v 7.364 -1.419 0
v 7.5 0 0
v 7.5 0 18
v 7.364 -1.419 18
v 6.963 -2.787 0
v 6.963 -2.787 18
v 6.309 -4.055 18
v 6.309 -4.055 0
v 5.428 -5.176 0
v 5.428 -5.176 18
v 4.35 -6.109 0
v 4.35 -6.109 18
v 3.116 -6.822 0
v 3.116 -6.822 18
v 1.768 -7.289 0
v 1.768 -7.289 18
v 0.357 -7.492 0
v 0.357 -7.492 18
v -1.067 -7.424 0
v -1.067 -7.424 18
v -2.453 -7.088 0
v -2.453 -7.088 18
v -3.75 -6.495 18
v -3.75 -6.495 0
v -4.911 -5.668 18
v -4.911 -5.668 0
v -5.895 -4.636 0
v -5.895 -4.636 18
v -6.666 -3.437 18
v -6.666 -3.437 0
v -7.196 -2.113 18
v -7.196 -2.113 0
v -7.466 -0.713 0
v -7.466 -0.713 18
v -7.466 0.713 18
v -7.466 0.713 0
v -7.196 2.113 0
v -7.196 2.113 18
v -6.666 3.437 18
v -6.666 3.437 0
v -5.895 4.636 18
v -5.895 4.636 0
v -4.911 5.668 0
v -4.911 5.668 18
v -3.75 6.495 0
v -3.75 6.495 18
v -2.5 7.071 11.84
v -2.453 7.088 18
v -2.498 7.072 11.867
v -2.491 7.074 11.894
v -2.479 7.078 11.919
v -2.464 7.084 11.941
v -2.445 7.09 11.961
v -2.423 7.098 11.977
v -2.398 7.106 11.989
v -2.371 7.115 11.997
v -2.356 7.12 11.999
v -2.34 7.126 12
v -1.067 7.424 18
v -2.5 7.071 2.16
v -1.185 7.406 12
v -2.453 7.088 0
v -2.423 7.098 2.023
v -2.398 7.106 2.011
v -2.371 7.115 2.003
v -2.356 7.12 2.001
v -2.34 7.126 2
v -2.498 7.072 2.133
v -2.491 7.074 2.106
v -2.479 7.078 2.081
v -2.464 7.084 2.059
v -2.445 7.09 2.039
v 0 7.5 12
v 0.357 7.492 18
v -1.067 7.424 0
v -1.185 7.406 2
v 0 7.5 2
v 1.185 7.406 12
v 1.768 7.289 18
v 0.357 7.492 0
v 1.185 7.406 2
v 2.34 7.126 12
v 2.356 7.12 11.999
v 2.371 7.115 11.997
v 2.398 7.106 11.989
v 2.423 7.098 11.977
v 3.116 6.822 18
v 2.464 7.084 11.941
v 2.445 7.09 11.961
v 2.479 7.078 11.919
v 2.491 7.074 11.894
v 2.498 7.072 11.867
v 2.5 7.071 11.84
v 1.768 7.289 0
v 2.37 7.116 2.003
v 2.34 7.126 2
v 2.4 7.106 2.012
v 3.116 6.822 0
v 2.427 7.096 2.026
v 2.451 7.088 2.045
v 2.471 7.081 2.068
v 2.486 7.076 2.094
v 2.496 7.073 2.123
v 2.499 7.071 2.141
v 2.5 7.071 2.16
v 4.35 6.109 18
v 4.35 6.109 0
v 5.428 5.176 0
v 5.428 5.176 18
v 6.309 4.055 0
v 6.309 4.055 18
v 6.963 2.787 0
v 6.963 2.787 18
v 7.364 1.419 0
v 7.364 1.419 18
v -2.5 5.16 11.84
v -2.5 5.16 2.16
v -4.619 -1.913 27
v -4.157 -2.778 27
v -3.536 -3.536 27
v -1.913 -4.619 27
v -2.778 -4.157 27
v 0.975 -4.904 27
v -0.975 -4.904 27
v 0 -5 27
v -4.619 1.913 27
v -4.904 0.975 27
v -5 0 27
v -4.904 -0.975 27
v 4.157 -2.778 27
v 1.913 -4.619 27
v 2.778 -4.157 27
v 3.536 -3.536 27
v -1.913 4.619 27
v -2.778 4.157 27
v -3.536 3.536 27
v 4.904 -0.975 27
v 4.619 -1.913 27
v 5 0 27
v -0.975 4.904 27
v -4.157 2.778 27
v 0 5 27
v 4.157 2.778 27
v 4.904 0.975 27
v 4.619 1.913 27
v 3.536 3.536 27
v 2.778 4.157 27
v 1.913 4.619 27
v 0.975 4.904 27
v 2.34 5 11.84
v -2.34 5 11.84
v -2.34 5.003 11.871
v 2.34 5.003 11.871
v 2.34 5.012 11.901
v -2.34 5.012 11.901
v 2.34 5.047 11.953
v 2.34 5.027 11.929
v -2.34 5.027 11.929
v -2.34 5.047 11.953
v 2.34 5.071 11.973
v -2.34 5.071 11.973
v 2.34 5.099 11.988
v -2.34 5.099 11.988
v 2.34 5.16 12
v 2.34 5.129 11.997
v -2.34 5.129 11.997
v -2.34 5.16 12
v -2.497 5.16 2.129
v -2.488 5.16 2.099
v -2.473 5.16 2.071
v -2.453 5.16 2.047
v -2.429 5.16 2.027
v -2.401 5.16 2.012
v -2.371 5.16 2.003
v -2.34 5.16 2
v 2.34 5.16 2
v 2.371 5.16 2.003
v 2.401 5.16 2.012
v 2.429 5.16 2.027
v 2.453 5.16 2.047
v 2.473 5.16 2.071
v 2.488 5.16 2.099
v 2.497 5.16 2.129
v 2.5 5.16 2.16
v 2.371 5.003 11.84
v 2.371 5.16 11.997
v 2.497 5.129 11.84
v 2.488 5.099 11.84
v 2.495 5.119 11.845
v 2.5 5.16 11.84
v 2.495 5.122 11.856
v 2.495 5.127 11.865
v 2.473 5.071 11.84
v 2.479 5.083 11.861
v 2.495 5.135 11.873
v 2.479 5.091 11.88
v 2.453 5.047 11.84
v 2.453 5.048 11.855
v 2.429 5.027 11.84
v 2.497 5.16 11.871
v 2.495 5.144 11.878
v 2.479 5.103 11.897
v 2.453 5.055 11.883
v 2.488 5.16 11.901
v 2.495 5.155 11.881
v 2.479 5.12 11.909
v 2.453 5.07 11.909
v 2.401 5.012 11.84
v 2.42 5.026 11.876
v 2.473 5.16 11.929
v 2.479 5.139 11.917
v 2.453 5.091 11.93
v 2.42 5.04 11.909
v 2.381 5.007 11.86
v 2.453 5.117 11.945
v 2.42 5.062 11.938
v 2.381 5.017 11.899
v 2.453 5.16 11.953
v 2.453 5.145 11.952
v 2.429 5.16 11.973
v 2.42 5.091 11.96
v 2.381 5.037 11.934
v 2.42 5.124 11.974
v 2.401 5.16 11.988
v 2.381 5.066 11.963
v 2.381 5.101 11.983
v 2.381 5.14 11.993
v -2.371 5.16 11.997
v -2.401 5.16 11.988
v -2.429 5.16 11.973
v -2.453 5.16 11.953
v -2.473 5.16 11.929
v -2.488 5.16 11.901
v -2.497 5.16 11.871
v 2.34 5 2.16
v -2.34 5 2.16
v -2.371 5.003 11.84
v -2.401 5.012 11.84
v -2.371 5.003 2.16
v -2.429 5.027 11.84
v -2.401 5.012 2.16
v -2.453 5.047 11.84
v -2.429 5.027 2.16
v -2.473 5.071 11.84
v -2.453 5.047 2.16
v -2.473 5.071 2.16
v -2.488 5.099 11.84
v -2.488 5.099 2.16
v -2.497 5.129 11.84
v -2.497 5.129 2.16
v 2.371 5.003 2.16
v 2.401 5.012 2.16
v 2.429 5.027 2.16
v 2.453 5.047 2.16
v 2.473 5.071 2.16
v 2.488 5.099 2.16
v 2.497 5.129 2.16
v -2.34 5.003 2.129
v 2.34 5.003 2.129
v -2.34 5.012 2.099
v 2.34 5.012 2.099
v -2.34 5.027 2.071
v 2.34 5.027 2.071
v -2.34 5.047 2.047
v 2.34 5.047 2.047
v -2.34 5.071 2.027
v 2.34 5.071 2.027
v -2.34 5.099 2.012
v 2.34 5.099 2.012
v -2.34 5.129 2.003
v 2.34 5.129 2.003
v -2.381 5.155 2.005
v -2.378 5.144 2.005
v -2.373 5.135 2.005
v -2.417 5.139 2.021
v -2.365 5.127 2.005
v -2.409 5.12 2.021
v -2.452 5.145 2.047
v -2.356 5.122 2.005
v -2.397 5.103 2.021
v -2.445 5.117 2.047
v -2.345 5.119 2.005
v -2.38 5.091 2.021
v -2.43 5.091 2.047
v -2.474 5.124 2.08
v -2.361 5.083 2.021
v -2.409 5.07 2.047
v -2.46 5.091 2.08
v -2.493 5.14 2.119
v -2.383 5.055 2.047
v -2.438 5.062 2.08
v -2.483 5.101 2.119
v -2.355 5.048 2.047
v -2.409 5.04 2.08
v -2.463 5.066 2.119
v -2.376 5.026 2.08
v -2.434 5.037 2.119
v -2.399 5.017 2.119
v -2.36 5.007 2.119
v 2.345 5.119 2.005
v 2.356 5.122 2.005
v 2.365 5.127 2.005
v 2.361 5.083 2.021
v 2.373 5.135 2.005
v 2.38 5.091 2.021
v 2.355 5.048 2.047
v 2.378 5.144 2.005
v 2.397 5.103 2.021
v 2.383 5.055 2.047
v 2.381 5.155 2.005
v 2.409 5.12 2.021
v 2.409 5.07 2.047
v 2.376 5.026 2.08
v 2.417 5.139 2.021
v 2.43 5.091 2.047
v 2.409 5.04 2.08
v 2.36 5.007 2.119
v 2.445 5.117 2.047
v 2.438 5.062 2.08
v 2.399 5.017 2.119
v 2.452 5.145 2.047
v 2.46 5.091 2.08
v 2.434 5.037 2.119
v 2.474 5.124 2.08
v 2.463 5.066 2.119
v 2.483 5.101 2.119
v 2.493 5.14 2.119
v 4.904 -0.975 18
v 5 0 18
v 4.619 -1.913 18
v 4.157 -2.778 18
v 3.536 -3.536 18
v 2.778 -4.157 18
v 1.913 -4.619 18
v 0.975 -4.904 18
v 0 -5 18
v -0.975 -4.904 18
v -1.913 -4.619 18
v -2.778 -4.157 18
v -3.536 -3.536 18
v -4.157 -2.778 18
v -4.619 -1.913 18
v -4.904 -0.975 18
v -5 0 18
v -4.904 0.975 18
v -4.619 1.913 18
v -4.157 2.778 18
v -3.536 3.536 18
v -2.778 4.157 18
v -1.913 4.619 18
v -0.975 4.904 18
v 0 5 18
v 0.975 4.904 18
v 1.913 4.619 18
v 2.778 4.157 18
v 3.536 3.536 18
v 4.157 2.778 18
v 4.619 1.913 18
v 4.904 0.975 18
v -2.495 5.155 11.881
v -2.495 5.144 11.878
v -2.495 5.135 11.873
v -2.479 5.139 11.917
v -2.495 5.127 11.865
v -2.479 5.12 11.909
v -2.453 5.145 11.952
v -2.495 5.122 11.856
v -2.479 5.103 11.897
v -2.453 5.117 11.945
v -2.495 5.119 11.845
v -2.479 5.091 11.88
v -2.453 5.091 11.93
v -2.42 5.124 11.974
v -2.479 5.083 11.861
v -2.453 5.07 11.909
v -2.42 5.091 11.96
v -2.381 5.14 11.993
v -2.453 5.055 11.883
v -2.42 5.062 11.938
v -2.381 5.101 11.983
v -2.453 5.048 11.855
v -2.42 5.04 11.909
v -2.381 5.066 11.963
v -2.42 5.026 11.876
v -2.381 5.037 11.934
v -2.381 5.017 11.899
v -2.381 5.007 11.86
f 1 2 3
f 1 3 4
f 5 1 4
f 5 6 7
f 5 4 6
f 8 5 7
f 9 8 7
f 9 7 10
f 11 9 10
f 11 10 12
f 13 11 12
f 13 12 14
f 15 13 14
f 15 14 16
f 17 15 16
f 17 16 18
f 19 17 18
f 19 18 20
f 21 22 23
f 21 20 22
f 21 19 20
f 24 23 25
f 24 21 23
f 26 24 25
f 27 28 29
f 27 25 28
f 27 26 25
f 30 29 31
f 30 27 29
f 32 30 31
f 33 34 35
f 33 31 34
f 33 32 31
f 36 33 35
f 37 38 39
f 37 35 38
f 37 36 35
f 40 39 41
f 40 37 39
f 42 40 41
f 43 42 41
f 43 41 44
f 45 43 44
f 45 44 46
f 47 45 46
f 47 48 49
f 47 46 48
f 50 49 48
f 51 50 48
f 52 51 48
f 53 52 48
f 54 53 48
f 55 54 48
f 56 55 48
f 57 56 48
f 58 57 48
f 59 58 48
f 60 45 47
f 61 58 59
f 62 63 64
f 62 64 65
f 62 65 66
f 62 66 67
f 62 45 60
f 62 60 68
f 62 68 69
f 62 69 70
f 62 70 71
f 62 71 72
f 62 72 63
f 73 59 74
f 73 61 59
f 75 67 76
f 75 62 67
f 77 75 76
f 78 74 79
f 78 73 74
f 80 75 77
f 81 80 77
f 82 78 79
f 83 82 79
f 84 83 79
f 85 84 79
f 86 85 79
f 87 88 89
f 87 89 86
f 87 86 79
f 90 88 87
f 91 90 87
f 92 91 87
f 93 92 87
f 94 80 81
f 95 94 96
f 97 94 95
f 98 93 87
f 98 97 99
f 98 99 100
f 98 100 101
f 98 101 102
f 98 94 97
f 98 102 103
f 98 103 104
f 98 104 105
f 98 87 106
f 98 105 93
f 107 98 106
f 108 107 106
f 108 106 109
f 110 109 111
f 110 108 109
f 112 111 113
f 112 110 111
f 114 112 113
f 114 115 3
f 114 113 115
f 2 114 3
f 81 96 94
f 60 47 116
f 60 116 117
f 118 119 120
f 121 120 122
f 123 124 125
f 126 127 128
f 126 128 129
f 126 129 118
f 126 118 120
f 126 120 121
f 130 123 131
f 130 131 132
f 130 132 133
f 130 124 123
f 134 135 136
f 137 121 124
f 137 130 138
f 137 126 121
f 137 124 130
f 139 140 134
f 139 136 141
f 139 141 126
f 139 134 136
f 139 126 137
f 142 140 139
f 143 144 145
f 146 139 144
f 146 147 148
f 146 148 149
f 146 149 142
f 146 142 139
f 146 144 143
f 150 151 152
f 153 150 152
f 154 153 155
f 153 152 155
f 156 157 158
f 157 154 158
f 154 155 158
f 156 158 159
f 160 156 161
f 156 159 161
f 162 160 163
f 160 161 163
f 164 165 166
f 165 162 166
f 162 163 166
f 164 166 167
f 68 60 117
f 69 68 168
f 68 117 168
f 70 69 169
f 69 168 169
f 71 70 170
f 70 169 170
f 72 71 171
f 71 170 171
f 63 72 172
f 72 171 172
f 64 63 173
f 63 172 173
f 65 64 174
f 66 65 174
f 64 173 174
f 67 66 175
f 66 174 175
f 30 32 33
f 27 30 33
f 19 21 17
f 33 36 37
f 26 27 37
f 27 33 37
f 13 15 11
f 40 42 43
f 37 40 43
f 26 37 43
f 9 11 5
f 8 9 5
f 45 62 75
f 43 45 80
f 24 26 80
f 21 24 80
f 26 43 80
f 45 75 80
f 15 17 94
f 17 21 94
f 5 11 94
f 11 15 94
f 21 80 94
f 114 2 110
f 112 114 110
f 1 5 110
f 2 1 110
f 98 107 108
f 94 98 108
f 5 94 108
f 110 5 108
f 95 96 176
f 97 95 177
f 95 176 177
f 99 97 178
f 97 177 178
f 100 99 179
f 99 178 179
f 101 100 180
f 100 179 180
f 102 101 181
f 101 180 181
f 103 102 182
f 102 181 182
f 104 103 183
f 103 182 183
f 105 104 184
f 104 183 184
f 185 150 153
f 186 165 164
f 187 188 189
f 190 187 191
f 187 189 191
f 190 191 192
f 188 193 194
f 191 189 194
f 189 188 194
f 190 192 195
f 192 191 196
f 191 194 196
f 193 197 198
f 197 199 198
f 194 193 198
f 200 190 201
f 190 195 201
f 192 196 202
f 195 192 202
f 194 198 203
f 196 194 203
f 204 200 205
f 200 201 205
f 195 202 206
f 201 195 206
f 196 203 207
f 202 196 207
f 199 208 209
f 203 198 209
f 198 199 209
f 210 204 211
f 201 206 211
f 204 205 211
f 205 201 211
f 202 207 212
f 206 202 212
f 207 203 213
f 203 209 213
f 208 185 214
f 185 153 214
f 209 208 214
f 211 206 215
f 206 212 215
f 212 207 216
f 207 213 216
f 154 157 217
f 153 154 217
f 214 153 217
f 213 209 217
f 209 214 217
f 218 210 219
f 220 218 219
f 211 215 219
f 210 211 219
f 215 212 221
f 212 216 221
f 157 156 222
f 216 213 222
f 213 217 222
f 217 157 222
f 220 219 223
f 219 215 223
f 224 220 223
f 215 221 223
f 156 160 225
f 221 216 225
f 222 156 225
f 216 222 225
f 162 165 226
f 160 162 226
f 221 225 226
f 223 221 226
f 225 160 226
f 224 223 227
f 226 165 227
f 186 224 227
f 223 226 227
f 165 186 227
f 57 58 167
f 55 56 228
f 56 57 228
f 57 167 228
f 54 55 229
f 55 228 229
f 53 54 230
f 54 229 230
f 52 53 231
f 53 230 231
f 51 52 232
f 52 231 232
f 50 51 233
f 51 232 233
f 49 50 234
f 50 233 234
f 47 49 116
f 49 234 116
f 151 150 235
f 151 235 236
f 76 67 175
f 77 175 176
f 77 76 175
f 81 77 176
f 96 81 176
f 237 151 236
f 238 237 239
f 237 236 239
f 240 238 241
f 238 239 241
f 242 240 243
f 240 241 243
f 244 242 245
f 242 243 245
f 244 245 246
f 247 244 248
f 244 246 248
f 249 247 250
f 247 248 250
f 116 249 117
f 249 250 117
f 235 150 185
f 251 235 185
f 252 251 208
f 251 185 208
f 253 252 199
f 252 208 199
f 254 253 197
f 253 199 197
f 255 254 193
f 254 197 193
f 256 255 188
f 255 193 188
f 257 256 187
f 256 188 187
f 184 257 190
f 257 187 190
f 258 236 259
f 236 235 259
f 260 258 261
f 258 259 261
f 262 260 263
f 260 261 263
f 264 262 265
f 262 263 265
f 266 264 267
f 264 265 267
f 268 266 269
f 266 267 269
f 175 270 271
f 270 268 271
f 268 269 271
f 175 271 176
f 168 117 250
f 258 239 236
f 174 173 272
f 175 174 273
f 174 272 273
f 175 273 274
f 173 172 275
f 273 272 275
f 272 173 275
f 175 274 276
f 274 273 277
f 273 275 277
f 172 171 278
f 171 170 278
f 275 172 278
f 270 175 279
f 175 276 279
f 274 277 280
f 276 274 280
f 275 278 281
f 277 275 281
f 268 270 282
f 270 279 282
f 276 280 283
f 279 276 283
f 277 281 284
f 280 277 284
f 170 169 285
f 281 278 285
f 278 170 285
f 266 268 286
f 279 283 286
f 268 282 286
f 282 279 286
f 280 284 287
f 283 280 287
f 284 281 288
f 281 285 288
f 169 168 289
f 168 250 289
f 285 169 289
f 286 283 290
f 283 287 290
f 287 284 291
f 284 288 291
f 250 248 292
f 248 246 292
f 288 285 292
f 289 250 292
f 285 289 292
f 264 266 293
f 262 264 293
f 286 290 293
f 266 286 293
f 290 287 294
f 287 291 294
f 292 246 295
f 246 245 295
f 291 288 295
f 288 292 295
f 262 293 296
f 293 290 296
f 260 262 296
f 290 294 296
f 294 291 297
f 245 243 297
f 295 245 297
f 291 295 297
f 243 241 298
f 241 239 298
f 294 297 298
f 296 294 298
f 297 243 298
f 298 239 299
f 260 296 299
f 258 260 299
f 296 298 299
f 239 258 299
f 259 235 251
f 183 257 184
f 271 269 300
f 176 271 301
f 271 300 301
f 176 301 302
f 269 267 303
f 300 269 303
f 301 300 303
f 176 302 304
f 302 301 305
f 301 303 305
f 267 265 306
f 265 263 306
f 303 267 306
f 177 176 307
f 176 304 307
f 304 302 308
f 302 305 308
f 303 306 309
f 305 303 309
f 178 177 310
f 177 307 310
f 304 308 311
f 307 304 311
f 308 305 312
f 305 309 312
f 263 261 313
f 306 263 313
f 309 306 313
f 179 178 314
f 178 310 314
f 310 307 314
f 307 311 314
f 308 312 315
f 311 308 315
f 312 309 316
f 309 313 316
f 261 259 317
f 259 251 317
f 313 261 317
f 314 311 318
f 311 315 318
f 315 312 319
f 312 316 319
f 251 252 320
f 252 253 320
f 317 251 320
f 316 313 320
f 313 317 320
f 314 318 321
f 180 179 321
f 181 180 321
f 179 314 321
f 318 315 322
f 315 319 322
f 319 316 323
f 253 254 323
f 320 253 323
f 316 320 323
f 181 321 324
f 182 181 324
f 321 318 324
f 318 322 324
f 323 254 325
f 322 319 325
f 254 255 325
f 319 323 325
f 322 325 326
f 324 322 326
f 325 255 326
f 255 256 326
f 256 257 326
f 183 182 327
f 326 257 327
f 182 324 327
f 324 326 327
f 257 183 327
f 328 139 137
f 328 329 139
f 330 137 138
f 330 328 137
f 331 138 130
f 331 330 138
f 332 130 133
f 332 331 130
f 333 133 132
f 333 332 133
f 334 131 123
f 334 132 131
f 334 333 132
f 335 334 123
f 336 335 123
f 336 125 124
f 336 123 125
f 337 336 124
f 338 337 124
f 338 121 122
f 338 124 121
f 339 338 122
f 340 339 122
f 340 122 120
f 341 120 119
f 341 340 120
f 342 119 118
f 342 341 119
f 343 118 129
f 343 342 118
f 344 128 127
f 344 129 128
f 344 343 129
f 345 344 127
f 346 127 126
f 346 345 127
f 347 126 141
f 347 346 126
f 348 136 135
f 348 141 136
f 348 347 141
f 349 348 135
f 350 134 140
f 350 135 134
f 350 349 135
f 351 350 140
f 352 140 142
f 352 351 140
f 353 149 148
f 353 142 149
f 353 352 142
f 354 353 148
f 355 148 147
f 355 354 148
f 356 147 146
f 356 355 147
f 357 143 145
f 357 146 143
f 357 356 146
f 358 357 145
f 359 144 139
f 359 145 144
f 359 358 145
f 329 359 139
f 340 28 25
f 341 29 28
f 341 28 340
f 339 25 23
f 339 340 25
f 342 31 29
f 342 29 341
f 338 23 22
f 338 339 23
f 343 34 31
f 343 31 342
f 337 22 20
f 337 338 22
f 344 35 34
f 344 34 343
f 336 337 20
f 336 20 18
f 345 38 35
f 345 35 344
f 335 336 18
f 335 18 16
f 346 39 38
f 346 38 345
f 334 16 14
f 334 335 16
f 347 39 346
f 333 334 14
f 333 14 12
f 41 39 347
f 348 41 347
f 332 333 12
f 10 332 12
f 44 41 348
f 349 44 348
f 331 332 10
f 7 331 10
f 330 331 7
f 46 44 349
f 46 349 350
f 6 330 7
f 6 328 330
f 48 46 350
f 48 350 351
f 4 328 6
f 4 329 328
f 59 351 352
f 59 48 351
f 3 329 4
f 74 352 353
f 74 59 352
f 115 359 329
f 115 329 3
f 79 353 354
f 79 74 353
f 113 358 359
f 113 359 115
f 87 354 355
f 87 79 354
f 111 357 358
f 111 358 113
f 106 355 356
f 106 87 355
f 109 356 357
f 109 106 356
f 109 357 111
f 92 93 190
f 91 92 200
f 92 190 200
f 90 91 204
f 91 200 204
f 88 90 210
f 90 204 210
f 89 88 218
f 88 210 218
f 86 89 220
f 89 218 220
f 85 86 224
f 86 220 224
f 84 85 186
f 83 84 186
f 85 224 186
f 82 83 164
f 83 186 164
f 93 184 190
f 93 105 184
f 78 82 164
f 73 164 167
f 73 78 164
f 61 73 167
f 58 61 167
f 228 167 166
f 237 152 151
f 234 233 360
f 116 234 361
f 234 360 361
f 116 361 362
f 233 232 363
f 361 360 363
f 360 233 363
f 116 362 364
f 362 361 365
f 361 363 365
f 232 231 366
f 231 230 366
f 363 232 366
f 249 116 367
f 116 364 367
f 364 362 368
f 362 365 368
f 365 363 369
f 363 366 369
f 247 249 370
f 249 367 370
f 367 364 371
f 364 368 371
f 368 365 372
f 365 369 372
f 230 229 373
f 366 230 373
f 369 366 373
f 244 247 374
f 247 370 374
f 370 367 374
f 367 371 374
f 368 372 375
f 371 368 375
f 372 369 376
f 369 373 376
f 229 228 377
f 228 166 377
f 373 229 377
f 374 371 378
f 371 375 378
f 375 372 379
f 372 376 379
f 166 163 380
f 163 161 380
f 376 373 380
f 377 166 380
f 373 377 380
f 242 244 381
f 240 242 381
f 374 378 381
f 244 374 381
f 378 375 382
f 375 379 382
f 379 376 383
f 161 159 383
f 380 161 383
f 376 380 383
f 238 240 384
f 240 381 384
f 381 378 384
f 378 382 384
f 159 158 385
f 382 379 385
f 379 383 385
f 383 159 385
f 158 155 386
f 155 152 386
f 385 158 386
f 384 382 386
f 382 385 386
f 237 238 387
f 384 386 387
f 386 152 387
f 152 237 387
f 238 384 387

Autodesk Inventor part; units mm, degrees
ref_plane "YZ Plane" through (0, 0, 0) normal (1, 0, 0) x (0, 1, 0)
ref_plane "XY Plane" through (0, 0, 0) normal (0, 0, 1) x (1, 0, 0)
sketch "草圖2" plane through (0, 0, 0) normal (0, 0, 1) x (1, 0, 0)
  circle A0 centre (0, 0) radius 7.5
  dimension "d3" = 15
extrude "擠出2" add sketch "草圖2" along normal blind 18
sketch "草圖3" plane through (0, 0, 18) normal (0, 0, 1) x (1, 0, 0)
  circle A0 centre (0, 0) radius 5
  dimension "d6" = 10
extrude "擠出3" add sketch "草圖3" along normal blind 9
ref_plane "工作平面2" through (0, 7.5, 0) normal (0, 1, 0) x (-1, 0, 0)
sketch "草圖6" plane through (0, 7.5, 0) normal (0, 1, 0) x (-1, 0, 0)
  line L0 (-2.5, 12) -> (2.5, 12)
  line L1 (2.5, 12) -> (2.5, 2)
  line L2 (2.5, 2) -> (-2.5, 2)
  line L3 (-2.5, 2) -> (-2.5, 12)
  line L4 (-2.5, 12) -> (2.5, 2) construction
  line L5 (2.5, 12) -> (-2.5, 2) construction
  line L6 (-7.5, 0) -> (7.5, 0) projected
  point P0 (0, 0)
  point P1 (0, 7)
  dimension "d24" = 5
  dimension "d25" = 10
  dimension "d26" = 2
  dimension "d27" = 5
extrude "擠出6" cut sketch "草圖6" against normal blind 2.5
fillet "圓角3" radius 0.16 8 edges at (0, 5, 12) (2.5, 6.0355, 12) (2.5, 5, 7) (-2.5, 6.0355, 12) (-2.5, 5, 7) (-2.5, 6.0355, 2) (0, 5, 2) (2.5, 6.0355, 2)
properties part number "軸1"
